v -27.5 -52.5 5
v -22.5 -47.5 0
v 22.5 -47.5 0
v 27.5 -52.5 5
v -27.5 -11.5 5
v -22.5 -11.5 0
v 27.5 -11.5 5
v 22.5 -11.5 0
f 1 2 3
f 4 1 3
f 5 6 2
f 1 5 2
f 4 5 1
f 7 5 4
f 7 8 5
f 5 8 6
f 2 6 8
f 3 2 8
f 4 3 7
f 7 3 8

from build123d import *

# Parameters (mm, degrees)
F1_DEPTH = 5
F2_SIZE  = 4.99999


# Not quite as in the source:
# - a fillet or chamfer is up to 0.001 mm smaller than in the source, because OpenCascade refuses the exact size


with BuildPart() as f1:
    # F0 (on Top) → F1 (new body)
    with BuildSketch(Plane.XY):
        Polygon((-27.5, -52.5), (27.5, -52.5), (27.5, -14.74), (-27.5, -11.5), align=None)
        Polygon((-27.5, -11.5), (27.5, -14.74), (27.5, -11.5), align=None)
    extrude(amount=F1_DEPTH)

    # F2 (size 5 in the source; OpenCascade refuses exactly that, so slightly less here)
    f2_edges = [f1.edges().sort_by_distance(p)[0] for p in [
        (-27.5, -32, 0),
        (0, -52.5, 0),
        (27.5, -32, 0),
    ]]
    chamfer(f2_edges, length=F2_SIZE)


solid = f1.part
